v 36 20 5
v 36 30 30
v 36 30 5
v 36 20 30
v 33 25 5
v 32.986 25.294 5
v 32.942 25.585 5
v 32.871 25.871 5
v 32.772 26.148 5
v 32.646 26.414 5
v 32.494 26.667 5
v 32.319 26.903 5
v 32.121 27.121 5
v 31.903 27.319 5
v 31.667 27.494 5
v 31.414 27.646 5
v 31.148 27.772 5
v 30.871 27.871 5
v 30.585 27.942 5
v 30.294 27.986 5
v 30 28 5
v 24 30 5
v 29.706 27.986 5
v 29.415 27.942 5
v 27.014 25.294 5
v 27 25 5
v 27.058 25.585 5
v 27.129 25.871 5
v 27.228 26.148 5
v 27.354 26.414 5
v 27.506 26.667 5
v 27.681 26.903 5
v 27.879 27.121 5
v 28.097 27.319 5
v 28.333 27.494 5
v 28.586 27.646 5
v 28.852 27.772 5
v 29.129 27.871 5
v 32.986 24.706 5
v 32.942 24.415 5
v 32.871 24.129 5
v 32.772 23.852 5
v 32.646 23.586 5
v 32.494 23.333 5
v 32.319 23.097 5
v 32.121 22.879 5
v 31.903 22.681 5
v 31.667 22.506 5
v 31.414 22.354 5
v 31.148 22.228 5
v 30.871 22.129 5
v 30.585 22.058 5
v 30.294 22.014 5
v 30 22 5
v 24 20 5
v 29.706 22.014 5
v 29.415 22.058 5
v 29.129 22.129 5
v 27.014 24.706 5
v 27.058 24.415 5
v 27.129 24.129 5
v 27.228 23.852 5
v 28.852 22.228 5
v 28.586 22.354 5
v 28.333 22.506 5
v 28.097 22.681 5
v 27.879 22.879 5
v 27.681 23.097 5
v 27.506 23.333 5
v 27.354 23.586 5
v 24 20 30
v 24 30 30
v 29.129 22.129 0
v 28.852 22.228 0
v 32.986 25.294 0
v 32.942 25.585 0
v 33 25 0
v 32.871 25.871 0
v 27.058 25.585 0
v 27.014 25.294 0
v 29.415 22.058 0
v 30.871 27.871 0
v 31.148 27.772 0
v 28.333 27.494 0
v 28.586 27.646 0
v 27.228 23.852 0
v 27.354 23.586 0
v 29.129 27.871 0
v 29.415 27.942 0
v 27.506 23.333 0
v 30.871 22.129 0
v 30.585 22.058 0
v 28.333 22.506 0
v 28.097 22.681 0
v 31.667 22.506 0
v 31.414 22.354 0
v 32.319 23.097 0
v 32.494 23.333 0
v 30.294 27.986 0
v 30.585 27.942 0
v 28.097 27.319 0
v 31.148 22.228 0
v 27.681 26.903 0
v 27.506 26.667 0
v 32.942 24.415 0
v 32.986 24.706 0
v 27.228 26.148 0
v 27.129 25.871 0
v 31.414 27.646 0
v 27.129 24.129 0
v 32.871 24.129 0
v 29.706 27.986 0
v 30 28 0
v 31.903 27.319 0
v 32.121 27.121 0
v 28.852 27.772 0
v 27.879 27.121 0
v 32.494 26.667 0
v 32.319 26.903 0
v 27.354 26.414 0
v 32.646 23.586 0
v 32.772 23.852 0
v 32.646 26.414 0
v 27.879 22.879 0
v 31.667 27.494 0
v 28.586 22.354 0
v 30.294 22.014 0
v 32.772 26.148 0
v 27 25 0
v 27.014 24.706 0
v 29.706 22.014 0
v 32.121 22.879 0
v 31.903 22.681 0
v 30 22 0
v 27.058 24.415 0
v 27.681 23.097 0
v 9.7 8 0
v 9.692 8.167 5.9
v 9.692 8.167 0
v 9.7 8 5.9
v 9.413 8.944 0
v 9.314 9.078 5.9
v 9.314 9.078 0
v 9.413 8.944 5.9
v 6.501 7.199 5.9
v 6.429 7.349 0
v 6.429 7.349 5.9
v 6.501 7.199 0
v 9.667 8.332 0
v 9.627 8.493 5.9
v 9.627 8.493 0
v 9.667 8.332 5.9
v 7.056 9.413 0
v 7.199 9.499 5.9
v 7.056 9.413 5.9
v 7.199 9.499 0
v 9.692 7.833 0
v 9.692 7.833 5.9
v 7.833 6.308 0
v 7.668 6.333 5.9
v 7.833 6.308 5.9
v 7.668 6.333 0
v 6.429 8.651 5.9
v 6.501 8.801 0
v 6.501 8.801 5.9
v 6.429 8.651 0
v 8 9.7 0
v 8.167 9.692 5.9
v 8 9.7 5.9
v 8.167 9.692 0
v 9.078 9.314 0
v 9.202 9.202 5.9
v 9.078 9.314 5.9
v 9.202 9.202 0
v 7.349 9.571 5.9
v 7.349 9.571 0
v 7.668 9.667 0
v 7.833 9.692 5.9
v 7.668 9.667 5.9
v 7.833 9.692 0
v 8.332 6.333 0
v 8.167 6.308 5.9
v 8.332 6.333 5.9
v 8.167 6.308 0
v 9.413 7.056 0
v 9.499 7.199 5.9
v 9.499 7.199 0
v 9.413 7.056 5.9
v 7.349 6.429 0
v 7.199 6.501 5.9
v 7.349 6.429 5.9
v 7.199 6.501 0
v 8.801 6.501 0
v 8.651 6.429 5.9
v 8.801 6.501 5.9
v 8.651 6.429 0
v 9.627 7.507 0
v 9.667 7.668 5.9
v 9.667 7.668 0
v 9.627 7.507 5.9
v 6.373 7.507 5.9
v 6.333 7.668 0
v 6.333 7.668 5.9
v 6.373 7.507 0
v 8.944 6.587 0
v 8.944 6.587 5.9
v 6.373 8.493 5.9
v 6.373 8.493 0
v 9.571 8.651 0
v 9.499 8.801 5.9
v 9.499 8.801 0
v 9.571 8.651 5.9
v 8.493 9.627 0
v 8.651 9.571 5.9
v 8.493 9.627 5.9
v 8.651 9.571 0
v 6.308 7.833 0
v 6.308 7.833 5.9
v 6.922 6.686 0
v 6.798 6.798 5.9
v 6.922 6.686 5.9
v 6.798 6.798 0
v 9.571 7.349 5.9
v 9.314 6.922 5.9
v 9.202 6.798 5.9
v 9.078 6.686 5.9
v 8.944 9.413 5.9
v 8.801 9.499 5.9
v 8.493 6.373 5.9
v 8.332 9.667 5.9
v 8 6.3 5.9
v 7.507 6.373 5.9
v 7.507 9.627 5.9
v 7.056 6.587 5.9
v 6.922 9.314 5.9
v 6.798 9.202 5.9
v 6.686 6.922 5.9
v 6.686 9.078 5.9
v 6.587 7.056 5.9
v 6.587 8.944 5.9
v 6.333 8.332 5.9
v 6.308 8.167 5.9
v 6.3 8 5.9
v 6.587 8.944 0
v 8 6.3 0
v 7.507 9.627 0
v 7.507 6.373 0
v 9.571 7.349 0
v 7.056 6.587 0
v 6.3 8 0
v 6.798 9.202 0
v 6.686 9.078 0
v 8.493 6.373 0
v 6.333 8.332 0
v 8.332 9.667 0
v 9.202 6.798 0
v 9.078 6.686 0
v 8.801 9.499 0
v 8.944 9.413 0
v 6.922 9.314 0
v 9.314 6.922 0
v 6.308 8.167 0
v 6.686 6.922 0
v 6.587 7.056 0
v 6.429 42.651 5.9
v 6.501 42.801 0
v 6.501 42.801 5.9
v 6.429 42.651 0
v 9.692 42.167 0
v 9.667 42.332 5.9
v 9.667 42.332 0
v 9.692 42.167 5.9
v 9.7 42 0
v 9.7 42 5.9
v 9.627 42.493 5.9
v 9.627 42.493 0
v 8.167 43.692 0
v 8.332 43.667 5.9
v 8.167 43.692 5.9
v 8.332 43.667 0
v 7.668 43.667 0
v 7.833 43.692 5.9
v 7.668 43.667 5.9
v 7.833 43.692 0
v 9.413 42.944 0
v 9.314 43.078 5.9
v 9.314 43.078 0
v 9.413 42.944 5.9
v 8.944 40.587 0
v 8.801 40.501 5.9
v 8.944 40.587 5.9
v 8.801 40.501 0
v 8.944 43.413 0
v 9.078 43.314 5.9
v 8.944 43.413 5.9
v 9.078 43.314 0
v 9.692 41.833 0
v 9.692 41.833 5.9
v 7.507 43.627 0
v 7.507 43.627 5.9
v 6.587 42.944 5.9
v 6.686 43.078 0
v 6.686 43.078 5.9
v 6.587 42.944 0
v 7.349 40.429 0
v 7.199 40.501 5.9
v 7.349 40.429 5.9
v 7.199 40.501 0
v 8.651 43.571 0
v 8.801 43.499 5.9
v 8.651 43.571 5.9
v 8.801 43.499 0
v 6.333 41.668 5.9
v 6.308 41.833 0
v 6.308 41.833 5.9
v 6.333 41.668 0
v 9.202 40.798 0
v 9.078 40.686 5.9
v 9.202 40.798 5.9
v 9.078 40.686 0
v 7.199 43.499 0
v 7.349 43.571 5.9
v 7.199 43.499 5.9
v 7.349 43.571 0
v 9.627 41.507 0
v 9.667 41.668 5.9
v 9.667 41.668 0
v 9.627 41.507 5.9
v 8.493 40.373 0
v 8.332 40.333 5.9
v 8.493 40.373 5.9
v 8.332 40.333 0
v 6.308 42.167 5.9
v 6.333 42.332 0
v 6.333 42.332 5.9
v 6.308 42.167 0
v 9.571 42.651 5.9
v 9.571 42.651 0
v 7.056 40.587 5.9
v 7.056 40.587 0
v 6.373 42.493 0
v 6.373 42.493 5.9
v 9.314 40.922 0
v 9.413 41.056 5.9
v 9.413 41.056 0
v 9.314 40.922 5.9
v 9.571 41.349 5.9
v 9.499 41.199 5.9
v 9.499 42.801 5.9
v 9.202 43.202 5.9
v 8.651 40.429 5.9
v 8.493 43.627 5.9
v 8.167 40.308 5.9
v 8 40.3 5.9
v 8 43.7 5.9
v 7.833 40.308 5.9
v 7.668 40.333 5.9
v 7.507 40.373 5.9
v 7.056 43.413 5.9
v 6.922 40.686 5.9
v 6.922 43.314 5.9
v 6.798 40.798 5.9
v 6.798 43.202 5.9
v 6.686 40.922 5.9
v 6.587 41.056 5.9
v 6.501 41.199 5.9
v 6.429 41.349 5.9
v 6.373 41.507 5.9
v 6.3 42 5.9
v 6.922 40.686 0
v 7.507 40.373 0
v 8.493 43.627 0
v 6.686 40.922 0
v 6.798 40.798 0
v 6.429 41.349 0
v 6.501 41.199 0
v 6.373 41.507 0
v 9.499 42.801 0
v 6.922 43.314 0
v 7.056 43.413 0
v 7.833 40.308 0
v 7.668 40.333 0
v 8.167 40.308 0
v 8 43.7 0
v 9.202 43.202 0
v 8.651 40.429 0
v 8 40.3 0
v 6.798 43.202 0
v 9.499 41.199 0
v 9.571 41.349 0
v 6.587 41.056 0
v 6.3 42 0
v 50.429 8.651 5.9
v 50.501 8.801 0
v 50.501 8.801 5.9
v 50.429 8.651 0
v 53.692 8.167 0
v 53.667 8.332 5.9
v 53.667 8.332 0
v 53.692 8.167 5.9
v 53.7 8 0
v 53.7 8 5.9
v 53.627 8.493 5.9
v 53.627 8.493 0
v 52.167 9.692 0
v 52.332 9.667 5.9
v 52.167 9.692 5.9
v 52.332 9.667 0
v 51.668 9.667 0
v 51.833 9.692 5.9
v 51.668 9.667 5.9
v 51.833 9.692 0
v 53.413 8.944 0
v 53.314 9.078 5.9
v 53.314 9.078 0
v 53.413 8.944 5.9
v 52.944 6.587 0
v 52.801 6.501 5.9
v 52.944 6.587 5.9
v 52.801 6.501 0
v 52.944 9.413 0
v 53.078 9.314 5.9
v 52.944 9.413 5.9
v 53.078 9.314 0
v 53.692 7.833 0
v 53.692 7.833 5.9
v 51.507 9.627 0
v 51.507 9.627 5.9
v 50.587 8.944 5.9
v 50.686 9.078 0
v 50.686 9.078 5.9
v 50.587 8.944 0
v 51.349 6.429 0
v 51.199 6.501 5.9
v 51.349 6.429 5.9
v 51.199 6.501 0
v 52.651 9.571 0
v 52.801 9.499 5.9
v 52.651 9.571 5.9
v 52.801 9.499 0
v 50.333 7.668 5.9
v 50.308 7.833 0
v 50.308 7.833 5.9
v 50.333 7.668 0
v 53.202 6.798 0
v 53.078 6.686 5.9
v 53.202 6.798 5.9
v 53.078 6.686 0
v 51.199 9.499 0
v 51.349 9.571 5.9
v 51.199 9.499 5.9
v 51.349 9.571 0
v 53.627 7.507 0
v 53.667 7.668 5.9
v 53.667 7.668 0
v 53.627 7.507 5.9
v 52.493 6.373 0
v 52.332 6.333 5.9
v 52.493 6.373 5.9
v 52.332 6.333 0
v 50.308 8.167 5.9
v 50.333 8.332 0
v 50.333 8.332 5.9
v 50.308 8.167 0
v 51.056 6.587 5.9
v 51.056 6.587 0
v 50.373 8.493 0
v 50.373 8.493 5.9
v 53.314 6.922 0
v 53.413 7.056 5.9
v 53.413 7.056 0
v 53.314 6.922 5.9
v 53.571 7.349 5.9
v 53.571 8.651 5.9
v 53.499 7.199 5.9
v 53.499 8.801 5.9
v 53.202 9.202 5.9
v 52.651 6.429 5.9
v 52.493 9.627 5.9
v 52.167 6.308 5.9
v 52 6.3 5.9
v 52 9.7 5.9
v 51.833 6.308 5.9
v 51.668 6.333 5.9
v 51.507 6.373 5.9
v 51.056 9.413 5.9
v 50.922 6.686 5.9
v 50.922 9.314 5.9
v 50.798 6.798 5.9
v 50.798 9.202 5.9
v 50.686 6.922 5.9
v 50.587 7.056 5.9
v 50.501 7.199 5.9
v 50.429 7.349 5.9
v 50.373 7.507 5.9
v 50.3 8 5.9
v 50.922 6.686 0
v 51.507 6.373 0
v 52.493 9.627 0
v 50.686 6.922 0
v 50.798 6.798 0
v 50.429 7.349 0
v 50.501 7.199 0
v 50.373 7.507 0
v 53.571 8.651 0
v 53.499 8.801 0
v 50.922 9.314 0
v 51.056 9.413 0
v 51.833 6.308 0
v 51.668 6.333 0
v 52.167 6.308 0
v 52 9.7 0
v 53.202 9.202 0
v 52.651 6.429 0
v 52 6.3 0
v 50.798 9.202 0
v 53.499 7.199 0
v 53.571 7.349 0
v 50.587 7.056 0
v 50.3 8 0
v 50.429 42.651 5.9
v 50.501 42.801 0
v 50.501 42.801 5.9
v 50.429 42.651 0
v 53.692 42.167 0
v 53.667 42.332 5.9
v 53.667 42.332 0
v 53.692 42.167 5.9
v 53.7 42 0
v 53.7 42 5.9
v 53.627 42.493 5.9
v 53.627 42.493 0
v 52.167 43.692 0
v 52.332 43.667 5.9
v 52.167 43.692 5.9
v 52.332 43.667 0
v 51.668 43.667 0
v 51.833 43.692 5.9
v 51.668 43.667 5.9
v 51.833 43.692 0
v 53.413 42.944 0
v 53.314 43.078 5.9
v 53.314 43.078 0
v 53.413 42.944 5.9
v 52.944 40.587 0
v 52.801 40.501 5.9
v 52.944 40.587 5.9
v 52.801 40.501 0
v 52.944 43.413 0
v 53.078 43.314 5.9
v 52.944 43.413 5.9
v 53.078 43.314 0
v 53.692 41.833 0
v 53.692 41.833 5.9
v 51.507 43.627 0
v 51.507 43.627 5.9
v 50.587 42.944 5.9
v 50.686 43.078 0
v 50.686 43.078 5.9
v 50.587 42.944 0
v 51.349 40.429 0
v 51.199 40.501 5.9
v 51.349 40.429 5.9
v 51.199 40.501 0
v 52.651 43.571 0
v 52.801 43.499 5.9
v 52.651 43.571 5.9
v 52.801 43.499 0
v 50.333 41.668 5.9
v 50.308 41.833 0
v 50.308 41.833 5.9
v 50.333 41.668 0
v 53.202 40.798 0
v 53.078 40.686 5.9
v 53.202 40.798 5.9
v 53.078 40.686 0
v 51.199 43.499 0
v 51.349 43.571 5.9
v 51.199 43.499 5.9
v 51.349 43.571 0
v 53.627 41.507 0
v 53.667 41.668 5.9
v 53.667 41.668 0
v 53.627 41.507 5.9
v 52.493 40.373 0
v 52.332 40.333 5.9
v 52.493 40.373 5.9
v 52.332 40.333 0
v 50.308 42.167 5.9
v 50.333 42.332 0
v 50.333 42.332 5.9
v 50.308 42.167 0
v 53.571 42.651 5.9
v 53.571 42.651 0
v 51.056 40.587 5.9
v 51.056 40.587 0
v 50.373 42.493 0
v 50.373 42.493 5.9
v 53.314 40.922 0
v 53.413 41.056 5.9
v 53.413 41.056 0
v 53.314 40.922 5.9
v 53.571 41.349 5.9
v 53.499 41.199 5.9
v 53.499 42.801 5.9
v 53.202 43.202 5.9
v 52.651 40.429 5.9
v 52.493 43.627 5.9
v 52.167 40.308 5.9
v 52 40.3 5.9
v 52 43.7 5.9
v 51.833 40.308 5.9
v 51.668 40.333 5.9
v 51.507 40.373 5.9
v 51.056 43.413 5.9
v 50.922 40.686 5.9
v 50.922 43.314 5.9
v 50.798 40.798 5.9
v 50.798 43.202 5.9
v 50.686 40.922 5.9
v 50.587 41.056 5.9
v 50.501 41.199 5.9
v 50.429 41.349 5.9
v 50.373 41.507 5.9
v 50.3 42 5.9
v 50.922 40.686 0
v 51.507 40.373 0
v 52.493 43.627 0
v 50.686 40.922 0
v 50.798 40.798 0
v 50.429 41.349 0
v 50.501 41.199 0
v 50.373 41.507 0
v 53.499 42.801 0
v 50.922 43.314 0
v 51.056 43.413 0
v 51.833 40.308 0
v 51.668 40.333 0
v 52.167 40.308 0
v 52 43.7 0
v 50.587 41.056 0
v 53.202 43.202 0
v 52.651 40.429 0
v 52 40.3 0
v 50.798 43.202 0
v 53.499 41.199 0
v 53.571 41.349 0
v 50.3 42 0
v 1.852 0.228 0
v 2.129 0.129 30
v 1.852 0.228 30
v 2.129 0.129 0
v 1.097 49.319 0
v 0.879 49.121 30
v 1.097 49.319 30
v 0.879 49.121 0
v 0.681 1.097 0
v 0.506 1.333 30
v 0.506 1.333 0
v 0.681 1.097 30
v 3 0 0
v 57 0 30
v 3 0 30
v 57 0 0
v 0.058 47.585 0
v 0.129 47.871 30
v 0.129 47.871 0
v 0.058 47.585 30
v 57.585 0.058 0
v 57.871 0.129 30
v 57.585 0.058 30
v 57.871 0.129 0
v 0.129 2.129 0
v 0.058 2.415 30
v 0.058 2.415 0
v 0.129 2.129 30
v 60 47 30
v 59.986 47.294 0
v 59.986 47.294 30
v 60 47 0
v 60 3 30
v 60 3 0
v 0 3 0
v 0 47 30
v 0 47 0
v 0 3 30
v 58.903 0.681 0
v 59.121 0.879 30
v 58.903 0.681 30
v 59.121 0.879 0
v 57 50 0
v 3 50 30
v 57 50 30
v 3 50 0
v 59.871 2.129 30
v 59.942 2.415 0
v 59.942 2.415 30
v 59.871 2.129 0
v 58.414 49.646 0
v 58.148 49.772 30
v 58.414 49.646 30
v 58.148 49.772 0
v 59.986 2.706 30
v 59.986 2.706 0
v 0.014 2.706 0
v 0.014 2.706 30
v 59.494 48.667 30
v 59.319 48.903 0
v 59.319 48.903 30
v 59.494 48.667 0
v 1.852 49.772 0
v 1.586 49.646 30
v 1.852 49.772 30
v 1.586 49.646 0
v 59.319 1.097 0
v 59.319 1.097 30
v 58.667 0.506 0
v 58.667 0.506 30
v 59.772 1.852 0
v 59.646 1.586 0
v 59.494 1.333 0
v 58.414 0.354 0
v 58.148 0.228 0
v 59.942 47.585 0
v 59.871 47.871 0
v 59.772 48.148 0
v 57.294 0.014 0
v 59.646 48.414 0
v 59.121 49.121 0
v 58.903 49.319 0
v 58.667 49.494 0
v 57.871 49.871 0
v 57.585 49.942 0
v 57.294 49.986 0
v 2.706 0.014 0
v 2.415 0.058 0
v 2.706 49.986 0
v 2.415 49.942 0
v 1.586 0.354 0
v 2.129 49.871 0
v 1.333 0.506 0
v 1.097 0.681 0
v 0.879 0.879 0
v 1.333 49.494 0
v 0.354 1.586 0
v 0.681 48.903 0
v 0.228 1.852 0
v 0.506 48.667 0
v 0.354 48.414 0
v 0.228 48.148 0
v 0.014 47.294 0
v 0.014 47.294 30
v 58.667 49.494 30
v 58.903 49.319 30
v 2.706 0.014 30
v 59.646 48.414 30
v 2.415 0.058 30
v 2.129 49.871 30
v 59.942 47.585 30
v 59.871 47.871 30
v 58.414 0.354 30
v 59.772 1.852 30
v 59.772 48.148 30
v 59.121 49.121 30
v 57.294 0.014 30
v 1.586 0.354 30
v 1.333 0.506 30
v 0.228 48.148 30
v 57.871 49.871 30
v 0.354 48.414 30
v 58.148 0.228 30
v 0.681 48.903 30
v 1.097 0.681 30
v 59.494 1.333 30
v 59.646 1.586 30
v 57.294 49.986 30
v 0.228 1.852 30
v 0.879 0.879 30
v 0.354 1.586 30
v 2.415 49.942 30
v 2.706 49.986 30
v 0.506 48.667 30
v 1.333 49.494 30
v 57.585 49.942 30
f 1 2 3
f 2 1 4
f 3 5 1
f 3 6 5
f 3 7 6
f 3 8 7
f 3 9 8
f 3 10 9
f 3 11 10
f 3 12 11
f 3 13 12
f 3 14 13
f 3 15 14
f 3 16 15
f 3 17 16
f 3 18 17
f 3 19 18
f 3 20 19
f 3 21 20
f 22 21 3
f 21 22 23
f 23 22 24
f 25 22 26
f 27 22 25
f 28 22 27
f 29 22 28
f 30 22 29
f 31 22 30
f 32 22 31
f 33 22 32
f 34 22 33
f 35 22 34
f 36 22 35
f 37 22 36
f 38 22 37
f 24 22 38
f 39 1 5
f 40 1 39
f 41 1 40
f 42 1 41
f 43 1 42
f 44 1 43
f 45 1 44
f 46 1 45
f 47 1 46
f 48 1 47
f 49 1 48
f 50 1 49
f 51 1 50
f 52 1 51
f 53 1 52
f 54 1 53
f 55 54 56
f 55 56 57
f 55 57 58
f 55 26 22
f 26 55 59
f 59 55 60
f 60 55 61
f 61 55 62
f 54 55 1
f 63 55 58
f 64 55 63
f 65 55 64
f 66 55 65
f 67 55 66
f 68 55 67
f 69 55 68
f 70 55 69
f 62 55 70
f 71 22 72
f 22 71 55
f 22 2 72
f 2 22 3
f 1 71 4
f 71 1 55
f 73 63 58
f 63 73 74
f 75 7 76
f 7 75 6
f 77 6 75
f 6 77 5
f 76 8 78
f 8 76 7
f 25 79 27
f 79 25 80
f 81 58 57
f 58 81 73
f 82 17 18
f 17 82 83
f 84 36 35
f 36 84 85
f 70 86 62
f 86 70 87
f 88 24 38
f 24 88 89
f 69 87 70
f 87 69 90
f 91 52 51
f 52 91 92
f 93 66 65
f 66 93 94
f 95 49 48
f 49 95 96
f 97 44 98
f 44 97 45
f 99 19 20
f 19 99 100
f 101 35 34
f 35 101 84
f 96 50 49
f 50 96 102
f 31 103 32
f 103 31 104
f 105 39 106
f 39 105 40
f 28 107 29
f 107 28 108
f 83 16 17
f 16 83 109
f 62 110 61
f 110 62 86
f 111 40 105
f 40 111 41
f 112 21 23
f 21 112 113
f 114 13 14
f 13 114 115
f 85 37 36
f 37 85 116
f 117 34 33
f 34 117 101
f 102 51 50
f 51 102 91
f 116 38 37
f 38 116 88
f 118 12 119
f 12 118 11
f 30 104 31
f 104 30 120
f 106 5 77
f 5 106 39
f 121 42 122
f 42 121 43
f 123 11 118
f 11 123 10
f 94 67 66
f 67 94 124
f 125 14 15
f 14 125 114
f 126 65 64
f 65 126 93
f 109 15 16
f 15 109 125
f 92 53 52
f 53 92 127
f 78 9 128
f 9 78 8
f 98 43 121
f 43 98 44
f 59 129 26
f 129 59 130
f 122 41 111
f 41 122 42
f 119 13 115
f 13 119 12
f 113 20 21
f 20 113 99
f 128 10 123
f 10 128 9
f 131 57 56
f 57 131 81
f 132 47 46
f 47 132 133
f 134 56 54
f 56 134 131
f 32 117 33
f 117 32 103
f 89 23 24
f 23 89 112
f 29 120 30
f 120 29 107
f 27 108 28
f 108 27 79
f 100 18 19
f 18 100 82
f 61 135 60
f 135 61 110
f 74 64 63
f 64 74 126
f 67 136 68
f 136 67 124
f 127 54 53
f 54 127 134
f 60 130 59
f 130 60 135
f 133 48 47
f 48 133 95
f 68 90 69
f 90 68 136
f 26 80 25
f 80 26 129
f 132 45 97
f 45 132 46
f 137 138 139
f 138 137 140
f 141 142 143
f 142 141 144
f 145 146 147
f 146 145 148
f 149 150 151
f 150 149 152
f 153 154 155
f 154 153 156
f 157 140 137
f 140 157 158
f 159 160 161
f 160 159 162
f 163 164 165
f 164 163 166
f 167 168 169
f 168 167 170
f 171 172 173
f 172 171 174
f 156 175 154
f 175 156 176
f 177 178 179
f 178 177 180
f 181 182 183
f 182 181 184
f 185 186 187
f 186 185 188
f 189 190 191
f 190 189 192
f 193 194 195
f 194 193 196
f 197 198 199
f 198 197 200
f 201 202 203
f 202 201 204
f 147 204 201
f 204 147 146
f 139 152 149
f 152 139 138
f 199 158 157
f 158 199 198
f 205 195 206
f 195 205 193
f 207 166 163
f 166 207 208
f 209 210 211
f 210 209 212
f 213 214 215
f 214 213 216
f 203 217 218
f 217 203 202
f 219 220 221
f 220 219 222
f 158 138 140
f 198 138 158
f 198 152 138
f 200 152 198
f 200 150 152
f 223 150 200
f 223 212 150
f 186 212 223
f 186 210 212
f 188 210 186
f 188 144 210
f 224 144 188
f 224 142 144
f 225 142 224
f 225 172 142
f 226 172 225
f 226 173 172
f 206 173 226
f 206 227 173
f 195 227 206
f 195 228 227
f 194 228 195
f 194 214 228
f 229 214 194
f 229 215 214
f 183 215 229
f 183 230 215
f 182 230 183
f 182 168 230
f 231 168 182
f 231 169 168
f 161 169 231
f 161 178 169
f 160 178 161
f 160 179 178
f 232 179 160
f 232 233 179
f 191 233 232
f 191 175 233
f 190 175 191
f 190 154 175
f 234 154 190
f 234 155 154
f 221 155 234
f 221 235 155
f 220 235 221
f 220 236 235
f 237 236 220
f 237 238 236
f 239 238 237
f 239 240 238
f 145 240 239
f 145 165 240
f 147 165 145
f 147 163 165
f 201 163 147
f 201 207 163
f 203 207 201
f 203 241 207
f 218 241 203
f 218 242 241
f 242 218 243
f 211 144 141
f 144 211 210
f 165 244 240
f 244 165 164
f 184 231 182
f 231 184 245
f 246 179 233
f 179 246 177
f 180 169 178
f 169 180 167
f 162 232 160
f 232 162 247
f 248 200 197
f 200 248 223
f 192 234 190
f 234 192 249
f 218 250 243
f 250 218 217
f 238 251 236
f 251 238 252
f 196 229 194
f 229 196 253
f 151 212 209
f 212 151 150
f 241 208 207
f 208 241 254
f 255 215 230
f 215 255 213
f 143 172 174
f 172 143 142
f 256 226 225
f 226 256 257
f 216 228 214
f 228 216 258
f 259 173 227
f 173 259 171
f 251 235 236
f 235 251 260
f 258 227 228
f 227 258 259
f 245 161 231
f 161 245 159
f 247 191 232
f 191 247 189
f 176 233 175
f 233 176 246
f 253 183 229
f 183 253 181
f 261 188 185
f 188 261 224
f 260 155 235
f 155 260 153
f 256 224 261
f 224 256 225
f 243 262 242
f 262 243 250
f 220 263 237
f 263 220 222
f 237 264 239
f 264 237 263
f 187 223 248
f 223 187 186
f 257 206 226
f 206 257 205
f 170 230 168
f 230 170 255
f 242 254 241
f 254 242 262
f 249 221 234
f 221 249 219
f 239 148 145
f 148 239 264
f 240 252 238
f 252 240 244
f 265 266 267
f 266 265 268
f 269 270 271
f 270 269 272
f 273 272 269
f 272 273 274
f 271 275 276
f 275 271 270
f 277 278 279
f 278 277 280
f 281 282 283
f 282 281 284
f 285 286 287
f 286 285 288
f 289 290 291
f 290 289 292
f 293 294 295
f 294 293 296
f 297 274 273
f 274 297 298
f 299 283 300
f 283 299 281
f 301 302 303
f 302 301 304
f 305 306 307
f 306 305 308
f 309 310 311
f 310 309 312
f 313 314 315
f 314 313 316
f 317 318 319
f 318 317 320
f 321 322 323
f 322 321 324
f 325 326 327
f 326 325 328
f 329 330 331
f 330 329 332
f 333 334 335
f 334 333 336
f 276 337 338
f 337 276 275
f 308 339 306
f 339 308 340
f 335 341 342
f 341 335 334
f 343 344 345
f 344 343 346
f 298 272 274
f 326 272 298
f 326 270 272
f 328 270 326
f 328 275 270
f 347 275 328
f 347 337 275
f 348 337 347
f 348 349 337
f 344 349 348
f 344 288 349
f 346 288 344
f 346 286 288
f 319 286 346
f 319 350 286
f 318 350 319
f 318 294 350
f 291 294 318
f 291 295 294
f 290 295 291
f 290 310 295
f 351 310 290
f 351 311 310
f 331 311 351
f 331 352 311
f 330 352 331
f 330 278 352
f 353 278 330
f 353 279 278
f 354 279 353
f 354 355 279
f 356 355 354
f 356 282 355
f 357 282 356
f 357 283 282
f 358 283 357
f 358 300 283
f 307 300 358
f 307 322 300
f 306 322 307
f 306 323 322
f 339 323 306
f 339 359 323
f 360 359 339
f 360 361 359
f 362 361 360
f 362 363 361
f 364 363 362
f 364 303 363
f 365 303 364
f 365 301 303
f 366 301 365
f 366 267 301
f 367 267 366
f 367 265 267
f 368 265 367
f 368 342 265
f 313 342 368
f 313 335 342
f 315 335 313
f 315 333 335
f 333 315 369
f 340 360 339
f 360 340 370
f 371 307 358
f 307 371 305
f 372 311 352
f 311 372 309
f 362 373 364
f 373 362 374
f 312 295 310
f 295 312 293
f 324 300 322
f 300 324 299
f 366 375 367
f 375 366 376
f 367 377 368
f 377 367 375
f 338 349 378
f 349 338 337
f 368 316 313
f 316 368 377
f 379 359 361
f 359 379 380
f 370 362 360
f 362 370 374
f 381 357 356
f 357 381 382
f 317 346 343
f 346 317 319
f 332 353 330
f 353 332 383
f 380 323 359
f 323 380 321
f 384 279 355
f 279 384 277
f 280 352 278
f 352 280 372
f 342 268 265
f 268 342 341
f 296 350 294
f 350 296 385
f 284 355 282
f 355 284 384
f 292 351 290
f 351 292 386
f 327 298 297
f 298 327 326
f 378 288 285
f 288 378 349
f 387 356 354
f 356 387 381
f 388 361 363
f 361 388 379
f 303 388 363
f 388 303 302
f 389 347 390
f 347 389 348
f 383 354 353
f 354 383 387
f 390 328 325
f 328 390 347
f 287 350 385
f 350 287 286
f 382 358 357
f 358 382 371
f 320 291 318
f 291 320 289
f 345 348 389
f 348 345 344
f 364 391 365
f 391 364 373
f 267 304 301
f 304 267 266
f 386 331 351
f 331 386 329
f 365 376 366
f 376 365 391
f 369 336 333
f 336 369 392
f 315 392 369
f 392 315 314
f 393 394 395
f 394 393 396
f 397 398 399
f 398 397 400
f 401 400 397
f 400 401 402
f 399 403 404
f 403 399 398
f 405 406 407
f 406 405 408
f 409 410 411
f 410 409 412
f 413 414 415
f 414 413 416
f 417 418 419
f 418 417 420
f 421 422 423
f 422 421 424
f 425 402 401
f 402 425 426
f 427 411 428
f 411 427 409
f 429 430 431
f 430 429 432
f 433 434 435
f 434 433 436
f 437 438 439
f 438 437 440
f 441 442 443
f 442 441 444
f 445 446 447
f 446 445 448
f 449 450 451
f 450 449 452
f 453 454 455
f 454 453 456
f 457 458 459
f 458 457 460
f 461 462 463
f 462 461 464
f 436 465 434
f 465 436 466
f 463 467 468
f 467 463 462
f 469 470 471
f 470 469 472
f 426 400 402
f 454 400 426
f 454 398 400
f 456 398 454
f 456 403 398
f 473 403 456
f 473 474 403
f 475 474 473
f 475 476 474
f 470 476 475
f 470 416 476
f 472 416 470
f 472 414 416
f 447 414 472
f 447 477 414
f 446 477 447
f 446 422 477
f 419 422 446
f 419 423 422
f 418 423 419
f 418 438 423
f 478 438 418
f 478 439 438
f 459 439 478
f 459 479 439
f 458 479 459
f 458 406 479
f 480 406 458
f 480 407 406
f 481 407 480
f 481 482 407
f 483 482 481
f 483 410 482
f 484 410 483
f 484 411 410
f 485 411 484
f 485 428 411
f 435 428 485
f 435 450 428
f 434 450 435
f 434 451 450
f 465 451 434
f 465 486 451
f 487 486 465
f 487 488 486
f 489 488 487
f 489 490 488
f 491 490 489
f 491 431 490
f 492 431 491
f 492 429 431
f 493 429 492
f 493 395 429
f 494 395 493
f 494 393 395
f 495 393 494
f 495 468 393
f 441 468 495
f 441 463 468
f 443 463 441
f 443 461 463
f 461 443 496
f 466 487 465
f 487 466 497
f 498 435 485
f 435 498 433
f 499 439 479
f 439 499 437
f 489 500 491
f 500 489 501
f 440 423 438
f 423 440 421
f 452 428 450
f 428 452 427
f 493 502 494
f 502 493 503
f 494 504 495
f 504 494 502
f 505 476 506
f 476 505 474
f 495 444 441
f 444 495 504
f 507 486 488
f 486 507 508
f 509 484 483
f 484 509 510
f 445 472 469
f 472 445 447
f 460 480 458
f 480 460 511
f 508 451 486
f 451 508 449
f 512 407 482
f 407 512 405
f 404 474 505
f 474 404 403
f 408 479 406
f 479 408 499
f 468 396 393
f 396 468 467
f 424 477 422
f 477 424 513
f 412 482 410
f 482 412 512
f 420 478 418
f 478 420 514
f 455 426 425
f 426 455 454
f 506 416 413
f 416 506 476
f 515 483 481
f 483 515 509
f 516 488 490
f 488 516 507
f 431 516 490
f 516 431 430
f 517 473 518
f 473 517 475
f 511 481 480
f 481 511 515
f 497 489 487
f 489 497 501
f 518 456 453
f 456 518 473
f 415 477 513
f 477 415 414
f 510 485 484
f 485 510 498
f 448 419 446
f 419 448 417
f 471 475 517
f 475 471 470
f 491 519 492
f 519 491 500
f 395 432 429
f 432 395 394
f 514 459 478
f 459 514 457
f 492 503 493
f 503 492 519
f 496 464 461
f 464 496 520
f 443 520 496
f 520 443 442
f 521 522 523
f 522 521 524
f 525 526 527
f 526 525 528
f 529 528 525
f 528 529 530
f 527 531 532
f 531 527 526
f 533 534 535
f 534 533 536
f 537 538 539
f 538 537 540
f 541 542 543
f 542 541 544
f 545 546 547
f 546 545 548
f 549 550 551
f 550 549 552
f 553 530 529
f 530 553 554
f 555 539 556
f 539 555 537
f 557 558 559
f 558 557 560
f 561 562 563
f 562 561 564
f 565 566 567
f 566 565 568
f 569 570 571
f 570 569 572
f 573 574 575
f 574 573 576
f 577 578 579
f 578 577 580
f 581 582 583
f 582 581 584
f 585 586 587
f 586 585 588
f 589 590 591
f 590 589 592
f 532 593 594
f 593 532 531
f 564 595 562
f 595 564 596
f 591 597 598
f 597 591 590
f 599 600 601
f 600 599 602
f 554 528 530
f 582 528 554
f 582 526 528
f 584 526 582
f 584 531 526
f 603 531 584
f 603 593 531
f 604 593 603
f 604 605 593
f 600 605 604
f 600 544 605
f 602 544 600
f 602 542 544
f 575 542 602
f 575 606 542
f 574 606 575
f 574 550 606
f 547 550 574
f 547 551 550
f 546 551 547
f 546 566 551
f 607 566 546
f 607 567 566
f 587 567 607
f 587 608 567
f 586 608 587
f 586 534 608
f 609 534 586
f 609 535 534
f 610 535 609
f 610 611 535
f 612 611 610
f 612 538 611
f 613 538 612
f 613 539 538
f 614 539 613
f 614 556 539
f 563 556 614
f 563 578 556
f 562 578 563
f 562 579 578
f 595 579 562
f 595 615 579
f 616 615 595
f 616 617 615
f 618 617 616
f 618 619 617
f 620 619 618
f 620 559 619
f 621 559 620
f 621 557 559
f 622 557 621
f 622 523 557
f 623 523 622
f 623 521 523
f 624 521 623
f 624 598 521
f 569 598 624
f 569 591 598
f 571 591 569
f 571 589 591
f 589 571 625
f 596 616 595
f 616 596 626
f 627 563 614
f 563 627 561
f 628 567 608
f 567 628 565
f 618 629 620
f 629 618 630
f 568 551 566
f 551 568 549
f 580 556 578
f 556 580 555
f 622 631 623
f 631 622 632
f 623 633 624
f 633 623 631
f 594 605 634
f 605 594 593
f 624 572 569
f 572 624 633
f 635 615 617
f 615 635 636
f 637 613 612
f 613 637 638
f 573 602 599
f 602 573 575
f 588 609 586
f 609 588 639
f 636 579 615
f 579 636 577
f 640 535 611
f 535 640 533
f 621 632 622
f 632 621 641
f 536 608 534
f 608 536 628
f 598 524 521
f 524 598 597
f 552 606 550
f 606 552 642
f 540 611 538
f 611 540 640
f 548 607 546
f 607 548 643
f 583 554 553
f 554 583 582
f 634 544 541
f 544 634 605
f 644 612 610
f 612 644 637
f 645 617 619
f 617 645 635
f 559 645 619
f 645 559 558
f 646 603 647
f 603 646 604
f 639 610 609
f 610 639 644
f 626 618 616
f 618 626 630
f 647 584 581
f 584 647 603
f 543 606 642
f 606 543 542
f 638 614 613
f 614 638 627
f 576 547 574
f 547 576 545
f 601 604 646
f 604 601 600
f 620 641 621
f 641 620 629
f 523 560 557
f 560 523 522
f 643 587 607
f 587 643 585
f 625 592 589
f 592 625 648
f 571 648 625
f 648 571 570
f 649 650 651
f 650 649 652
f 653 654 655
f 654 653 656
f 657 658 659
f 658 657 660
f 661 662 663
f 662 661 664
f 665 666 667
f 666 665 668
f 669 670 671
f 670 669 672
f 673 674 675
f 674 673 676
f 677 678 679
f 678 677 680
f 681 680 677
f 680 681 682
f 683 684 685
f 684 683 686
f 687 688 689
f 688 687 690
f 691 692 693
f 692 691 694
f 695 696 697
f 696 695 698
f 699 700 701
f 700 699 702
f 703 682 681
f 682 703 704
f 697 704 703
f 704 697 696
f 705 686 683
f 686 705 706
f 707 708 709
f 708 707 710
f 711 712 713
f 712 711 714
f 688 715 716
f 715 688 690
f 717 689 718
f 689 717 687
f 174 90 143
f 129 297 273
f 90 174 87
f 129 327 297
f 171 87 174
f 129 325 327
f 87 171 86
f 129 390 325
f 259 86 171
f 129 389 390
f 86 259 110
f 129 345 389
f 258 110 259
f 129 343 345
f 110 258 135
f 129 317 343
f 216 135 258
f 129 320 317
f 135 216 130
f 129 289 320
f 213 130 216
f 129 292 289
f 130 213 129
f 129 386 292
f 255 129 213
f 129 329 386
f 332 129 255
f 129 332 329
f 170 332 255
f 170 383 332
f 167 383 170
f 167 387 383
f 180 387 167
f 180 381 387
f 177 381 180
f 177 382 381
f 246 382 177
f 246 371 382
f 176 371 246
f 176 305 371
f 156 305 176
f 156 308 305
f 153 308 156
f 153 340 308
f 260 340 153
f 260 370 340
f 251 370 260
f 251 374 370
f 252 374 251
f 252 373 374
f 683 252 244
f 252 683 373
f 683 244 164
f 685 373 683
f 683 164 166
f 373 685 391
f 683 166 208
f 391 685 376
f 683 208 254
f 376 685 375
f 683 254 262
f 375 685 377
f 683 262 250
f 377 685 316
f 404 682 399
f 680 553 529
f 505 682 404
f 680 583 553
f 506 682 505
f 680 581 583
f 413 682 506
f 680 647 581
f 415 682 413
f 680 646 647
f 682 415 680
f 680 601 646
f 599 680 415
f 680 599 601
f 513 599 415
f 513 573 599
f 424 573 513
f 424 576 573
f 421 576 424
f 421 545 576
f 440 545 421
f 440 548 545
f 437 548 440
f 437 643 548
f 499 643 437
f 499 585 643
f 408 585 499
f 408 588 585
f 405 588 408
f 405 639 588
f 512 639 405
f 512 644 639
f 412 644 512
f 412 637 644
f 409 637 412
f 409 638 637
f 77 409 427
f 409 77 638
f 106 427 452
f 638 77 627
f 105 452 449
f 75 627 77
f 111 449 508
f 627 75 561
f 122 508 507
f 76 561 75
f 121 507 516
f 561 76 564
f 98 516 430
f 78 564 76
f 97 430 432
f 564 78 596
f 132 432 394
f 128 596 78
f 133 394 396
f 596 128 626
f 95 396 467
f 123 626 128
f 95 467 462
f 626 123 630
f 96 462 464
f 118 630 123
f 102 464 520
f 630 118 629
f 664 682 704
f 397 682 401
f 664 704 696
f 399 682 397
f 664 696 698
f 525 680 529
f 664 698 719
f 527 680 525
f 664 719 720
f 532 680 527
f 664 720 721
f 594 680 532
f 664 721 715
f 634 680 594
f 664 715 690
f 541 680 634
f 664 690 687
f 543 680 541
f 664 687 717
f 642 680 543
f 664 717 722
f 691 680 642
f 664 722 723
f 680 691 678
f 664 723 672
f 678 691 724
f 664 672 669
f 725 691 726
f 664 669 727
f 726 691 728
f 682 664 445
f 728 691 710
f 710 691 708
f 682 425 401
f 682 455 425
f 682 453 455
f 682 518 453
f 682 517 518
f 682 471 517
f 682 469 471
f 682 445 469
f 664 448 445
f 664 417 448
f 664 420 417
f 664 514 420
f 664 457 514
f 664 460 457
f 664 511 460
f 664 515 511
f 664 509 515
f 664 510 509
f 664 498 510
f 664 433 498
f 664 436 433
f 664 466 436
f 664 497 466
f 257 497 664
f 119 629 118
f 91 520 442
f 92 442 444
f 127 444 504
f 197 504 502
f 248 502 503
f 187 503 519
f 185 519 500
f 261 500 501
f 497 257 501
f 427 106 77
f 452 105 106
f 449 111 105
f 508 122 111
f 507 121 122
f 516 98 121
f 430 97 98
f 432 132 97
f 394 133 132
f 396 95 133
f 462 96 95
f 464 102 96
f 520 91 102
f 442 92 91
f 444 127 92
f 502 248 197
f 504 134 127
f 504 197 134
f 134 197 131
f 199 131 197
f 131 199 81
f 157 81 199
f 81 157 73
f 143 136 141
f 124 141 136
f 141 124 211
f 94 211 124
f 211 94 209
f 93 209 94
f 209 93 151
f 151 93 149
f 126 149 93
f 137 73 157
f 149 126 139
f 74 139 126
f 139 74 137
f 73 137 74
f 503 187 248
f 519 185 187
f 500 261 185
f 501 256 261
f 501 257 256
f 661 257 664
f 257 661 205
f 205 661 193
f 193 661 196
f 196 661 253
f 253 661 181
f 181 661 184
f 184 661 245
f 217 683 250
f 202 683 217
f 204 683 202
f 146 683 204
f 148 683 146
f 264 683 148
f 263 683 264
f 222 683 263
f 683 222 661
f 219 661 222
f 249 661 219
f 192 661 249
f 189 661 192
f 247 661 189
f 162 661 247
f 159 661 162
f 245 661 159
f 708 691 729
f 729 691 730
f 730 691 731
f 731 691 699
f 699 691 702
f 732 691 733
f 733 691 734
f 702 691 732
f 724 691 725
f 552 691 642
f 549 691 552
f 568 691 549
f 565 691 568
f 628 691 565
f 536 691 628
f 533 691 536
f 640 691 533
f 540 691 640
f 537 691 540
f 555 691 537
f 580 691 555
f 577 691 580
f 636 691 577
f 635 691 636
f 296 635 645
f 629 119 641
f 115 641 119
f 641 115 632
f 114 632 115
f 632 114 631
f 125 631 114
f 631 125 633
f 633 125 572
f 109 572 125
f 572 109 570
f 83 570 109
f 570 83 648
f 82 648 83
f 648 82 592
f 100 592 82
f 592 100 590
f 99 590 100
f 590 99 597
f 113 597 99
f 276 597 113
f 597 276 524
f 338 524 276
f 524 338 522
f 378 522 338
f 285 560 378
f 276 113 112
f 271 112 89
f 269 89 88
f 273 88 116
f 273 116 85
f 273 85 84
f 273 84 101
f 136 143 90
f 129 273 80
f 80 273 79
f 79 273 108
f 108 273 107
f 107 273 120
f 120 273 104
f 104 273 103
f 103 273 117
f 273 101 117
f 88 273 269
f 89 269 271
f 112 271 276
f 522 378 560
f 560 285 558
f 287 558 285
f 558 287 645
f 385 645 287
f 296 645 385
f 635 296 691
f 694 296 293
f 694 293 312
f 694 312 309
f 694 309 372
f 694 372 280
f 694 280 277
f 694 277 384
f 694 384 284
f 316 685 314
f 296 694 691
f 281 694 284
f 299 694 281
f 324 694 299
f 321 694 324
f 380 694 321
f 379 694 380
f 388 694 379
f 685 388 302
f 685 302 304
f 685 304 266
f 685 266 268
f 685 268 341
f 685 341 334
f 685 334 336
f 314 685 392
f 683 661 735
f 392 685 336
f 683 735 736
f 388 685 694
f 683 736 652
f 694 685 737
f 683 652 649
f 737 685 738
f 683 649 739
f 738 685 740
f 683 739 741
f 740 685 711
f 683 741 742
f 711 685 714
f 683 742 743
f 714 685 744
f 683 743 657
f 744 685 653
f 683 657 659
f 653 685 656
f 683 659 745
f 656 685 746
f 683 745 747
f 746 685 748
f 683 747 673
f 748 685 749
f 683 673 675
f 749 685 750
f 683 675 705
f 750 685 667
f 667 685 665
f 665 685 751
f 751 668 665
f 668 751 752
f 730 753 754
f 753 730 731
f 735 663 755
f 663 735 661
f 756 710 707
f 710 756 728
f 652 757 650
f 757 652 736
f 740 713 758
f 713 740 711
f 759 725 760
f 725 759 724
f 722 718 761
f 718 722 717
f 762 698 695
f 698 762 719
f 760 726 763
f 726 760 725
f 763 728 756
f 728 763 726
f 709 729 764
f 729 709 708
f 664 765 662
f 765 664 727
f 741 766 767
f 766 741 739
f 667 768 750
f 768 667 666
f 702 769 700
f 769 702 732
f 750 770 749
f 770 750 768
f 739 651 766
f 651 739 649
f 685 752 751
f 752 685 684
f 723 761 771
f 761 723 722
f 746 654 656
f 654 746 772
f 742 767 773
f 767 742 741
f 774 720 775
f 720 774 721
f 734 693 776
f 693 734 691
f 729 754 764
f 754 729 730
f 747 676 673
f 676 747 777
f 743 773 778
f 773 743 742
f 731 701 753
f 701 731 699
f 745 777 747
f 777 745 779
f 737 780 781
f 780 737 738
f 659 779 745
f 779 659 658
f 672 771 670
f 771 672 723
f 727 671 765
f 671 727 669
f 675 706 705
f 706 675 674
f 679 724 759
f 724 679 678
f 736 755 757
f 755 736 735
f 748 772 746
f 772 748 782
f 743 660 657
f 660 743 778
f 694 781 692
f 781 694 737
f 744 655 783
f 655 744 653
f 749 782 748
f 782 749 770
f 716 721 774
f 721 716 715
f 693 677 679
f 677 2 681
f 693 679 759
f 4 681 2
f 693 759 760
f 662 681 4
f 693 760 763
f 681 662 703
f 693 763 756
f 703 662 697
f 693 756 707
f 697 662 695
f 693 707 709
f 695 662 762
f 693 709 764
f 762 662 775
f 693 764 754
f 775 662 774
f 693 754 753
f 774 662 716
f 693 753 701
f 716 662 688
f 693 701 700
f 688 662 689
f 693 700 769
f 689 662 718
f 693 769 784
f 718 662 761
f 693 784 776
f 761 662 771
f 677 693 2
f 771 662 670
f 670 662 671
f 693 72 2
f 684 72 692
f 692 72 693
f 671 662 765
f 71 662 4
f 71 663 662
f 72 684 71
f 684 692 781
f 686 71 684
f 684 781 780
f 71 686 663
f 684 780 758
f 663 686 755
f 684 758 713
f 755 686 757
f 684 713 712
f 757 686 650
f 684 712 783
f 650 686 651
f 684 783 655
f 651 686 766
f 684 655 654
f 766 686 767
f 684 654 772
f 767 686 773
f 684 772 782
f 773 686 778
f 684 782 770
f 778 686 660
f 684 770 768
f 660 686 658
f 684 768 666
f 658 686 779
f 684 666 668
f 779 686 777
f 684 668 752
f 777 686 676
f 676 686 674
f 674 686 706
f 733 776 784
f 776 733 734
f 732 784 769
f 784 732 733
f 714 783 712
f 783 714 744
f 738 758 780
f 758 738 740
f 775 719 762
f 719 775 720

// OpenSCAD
// file: params.scad
// Cat Feeder 5000 — Shared Parameters & Common Modules
// Include this file first in all part files: include <params.scad>

// ===== DIMENSIONS =====
WALL = 3;                // Standard wall thickness (mm)
THIN_WALL = 2.5;         // Thin walls (antenna arch, etc.)
FLOOR = 4;               // Base floor thickness
INSERT_BORE = 4.7;       // M3 heat-set insert pocket bore
M3_CLEAR = 3.4;          // M3 clearance hole
UNIT_W = 160;            // Main body width
UNIT_D = 240;            // Main body depth
UNIT_H = 160;            // Main body height
GATE_W = 118;            // Gate flap width
GATE_H = 90;             // Gate flap height
GATE_T = 3;              // Gate flap thickness
GATE_ROD_D = 3.2;        // Gate hinge rod diameter
ARCH_SPAN = 160;         // Antenna arch left-to-right span
ARCH_H = 70;             // Antenna arch height
ARCH_D = 40;             // Antenna arch depth (front-to-back)
COIL_CH_W = 16;          // Coil channel width
COIL_CH_D = 5;           // Coil channel depth
SERVO_W = 23;            // SG90 servo width
SERVO_D = 12.5;          // SG90 servo depth
SERVO_H = 30;            // SG90 servo height
SERVO_EAR_SPAN = 28;     // SG90 servo ear spacing
TOLERANCE = 0.1;         // General fit tolerance

// ===== RENDER QUALITY =====
$fn = 64;                // Circle resolution (smooth curves)

// ===== COLORS =====
COL_RFID = [0.8, 0.2, 0.2, 0.8];      // Red — RFID antenna arch
COL_TPU = [0.4, 0.7, 0.3, 0.8];       // Green — TPU flexible parts
COL_GATE = [0.2, 0.5, 0.8, 0.8];      // Blue — Gate mechanism
COL_BODY = [0.6, 0.6, 0.6, 0.8];      // Gray — Main body structure

// ===== COMMON MODULES =====

// M3 heat-set insert pocket (bore hole for pressed insert)
module m3_insert(h = 8) {
    cylinder(d = INSERT_BORE, h = h);
}

// M3 clearance hole (for bolt pass-through)
module m3_clear(h = 8) {
    cylinder(d = M3_CLEAR, h = h);
}

// Fillet box: rectangular box with filleted corners
// w, d, h = width, depth, height; r = corner radius
module fillet_box(w, d, h, r = 2) {
    hull() {
        translate([r, r, 0])
            cylinder(r = r, h = h);
        translate([w - r, r, 0])
            cylinder(r = r, h = h);
        translate([r, d - r, 0])
            cylinder(r = r, h = h);
        translate([w - r, d - r, 0])
            cylinder(r = r, h = h);
    }
}

// Boss: raised circular pad with M3 pocket
// Useful for internal reinforcement at bolt points
module boss(d = 10, h = 4, pocket = true) {
    difference() {
        cylinder(d = d, h = h);
        if (pocket)
            translate([0, 0, -0.1])
                m3_clear(h = h + 0.2);
    }
}
// main file
// Cat Feeder 5000 — Part 06: Motor Mount
// Mounts auger drive motor (N20 or NEMA14 stepper) aligned to auger tube.
// Print: PETG, 0.25mm layers, 40% infill, no supports

include <params.scad>

// Set MOTOR_TYPE to "N20" or "NEMA14"
MOTOR_TYPE = "N20";

color(COL_BODY) motor_mount();

module motor_mount() {
    MW = 60; MD = 50; MH = 30;
    SHAFT_H = 15; // Height of shaft center from base

    difference() {
        fillet_box(MW, MD, MH, r=3);

        if (MOTOR_TYPE == "N20") {
            // N20 motor pocket: 12mm × 10mm × 25mm
            translate([MW/2 - 6, MD/2 - 5, MH - 25])
                cube([12, 10, 26]);
            // Shaft bore
            translate([MW/2, MD/2, -0.1])
                cylinder(d=6, h=SHAFT_H + 1);
        } else {
            // NEMA14 pocket: 28mm sq
            translate([MW/2 - 14, MD/2 - 14, MH - 20])
                cube([28, 28, 21]);
            // NEMA14 shaft bore
            translate([MW/2, MD/2, -0.1])
                cylinder(d=8, h=SHAFT_H + 1);
            // NEMA14 mount holes (M3, 26mm bolt circle)
            for (x=[-13,13]) for (y=[-13,13])
                translate([MW/2+x, MD/2+y, -0.1])
                    m3_clear(h=MH+0.2);
        }

        // Body mount holes (M3 clearance, 4 corners)
        for (x=[8, MW-8]) for (y=[8, MD-8])
            translate([x, y, -0.1]) m3_clear(h=6);
    }
}
